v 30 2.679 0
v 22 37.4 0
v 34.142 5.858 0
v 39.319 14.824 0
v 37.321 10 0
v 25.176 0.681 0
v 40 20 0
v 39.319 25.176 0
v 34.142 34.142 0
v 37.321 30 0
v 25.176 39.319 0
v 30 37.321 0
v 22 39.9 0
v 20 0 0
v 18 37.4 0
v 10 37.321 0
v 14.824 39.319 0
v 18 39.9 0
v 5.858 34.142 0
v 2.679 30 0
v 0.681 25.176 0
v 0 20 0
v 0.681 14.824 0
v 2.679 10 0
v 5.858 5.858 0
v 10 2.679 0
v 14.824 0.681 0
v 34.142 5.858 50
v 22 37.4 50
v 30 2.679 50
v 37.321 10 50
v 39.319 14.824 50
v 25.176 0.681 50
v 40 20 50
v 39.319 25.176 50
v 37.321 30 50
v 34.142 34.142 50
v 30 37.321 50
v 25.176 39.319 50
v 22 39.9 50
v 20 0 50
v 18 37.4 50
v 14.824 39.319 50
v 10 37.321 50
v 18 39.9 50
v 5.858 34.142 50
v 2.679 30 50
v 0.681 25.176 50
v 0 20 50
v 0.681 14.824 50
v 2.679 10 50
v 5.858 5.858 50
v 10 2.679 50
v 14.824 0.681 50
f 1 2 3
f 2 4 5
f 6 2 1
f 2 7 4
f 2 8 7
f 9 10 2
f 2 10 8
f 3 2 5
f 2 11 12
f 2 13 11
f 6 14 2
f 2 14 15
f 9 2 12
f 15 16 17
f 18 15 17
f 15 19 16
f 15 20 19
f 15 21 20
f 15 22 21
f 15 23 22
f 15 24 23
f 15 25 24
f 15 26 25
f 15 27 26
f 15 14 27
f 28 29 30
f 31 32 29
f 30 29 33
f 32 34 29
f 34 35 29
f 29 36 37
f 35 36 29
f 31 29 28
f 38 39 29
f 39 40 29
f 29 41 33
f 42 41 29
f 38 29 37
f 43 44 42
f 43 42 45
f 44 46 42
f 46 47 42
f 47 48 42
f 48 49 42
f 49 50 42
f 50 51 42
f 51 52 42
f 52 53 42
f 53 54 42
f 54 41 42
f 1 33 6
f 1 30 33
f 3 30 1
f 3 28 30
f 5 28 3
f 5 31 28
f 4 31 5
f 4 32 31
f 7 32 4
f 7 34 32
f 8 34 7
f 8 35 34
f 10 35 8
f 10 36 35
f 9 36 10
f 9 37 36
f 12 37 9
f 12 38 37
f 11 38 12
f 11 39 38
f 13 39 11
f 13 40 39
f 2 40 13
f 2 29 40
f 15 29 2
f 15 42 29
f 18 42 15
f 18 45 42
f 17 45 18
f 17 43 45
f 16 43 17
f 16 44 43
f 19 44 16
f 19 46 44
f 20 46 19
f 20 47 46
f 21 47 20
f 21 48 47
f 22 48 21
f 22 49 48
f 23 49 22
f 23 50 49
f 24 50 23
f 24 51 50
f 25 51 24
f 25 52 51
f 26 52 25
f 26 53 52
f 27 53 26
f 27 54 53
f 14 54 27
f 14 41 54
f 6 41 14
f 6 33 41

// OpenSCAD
$fn = 32;

// ----------------------------------------------------------------------
// Keyway shaft: d40 shaft, key 4 x 2.5 mm
// ----------------------------------------------------------------------

// --- parameters (mm) ---
shaft_r = 20;             // shaft radius
key_w = 4;                // keyway width
key_d = 2.5;              // keyway depth below the surface line
plate_t = 50;             // shaft length, Z (extrusion height)

shaft_d = 2 * shaft_r;  // shaft diameter
circle_step = 15;  // polygon sampling step, degrees

profile = [[14.824, 39.319], [10, 37.321], [5.858, 34.142], [2.679, 30], [0.681, 25.176], [0, 20], [0.681, 14.824], [2.679, 10], [5.858, 5.858], [10, 2.679], [14.824, 0.681], [20, 0], [25.176, 0.681], [30, 2.679], [34.142, 5.858], [37.321, 10], [39.319, 14.824], [40, 20], [39.319, 25.176], [37.321, 30], [34.142, 34.142], [30, 37.321], [25.176, 39.319], [22, 39.9], [22, 37.4], [18, 37.4], [18, 39.9]];  // primary outline, 27 points, counter clockwise

// --- the one profile operation ---
linear_extrude(height = plate_t) polygon(points = profile);
